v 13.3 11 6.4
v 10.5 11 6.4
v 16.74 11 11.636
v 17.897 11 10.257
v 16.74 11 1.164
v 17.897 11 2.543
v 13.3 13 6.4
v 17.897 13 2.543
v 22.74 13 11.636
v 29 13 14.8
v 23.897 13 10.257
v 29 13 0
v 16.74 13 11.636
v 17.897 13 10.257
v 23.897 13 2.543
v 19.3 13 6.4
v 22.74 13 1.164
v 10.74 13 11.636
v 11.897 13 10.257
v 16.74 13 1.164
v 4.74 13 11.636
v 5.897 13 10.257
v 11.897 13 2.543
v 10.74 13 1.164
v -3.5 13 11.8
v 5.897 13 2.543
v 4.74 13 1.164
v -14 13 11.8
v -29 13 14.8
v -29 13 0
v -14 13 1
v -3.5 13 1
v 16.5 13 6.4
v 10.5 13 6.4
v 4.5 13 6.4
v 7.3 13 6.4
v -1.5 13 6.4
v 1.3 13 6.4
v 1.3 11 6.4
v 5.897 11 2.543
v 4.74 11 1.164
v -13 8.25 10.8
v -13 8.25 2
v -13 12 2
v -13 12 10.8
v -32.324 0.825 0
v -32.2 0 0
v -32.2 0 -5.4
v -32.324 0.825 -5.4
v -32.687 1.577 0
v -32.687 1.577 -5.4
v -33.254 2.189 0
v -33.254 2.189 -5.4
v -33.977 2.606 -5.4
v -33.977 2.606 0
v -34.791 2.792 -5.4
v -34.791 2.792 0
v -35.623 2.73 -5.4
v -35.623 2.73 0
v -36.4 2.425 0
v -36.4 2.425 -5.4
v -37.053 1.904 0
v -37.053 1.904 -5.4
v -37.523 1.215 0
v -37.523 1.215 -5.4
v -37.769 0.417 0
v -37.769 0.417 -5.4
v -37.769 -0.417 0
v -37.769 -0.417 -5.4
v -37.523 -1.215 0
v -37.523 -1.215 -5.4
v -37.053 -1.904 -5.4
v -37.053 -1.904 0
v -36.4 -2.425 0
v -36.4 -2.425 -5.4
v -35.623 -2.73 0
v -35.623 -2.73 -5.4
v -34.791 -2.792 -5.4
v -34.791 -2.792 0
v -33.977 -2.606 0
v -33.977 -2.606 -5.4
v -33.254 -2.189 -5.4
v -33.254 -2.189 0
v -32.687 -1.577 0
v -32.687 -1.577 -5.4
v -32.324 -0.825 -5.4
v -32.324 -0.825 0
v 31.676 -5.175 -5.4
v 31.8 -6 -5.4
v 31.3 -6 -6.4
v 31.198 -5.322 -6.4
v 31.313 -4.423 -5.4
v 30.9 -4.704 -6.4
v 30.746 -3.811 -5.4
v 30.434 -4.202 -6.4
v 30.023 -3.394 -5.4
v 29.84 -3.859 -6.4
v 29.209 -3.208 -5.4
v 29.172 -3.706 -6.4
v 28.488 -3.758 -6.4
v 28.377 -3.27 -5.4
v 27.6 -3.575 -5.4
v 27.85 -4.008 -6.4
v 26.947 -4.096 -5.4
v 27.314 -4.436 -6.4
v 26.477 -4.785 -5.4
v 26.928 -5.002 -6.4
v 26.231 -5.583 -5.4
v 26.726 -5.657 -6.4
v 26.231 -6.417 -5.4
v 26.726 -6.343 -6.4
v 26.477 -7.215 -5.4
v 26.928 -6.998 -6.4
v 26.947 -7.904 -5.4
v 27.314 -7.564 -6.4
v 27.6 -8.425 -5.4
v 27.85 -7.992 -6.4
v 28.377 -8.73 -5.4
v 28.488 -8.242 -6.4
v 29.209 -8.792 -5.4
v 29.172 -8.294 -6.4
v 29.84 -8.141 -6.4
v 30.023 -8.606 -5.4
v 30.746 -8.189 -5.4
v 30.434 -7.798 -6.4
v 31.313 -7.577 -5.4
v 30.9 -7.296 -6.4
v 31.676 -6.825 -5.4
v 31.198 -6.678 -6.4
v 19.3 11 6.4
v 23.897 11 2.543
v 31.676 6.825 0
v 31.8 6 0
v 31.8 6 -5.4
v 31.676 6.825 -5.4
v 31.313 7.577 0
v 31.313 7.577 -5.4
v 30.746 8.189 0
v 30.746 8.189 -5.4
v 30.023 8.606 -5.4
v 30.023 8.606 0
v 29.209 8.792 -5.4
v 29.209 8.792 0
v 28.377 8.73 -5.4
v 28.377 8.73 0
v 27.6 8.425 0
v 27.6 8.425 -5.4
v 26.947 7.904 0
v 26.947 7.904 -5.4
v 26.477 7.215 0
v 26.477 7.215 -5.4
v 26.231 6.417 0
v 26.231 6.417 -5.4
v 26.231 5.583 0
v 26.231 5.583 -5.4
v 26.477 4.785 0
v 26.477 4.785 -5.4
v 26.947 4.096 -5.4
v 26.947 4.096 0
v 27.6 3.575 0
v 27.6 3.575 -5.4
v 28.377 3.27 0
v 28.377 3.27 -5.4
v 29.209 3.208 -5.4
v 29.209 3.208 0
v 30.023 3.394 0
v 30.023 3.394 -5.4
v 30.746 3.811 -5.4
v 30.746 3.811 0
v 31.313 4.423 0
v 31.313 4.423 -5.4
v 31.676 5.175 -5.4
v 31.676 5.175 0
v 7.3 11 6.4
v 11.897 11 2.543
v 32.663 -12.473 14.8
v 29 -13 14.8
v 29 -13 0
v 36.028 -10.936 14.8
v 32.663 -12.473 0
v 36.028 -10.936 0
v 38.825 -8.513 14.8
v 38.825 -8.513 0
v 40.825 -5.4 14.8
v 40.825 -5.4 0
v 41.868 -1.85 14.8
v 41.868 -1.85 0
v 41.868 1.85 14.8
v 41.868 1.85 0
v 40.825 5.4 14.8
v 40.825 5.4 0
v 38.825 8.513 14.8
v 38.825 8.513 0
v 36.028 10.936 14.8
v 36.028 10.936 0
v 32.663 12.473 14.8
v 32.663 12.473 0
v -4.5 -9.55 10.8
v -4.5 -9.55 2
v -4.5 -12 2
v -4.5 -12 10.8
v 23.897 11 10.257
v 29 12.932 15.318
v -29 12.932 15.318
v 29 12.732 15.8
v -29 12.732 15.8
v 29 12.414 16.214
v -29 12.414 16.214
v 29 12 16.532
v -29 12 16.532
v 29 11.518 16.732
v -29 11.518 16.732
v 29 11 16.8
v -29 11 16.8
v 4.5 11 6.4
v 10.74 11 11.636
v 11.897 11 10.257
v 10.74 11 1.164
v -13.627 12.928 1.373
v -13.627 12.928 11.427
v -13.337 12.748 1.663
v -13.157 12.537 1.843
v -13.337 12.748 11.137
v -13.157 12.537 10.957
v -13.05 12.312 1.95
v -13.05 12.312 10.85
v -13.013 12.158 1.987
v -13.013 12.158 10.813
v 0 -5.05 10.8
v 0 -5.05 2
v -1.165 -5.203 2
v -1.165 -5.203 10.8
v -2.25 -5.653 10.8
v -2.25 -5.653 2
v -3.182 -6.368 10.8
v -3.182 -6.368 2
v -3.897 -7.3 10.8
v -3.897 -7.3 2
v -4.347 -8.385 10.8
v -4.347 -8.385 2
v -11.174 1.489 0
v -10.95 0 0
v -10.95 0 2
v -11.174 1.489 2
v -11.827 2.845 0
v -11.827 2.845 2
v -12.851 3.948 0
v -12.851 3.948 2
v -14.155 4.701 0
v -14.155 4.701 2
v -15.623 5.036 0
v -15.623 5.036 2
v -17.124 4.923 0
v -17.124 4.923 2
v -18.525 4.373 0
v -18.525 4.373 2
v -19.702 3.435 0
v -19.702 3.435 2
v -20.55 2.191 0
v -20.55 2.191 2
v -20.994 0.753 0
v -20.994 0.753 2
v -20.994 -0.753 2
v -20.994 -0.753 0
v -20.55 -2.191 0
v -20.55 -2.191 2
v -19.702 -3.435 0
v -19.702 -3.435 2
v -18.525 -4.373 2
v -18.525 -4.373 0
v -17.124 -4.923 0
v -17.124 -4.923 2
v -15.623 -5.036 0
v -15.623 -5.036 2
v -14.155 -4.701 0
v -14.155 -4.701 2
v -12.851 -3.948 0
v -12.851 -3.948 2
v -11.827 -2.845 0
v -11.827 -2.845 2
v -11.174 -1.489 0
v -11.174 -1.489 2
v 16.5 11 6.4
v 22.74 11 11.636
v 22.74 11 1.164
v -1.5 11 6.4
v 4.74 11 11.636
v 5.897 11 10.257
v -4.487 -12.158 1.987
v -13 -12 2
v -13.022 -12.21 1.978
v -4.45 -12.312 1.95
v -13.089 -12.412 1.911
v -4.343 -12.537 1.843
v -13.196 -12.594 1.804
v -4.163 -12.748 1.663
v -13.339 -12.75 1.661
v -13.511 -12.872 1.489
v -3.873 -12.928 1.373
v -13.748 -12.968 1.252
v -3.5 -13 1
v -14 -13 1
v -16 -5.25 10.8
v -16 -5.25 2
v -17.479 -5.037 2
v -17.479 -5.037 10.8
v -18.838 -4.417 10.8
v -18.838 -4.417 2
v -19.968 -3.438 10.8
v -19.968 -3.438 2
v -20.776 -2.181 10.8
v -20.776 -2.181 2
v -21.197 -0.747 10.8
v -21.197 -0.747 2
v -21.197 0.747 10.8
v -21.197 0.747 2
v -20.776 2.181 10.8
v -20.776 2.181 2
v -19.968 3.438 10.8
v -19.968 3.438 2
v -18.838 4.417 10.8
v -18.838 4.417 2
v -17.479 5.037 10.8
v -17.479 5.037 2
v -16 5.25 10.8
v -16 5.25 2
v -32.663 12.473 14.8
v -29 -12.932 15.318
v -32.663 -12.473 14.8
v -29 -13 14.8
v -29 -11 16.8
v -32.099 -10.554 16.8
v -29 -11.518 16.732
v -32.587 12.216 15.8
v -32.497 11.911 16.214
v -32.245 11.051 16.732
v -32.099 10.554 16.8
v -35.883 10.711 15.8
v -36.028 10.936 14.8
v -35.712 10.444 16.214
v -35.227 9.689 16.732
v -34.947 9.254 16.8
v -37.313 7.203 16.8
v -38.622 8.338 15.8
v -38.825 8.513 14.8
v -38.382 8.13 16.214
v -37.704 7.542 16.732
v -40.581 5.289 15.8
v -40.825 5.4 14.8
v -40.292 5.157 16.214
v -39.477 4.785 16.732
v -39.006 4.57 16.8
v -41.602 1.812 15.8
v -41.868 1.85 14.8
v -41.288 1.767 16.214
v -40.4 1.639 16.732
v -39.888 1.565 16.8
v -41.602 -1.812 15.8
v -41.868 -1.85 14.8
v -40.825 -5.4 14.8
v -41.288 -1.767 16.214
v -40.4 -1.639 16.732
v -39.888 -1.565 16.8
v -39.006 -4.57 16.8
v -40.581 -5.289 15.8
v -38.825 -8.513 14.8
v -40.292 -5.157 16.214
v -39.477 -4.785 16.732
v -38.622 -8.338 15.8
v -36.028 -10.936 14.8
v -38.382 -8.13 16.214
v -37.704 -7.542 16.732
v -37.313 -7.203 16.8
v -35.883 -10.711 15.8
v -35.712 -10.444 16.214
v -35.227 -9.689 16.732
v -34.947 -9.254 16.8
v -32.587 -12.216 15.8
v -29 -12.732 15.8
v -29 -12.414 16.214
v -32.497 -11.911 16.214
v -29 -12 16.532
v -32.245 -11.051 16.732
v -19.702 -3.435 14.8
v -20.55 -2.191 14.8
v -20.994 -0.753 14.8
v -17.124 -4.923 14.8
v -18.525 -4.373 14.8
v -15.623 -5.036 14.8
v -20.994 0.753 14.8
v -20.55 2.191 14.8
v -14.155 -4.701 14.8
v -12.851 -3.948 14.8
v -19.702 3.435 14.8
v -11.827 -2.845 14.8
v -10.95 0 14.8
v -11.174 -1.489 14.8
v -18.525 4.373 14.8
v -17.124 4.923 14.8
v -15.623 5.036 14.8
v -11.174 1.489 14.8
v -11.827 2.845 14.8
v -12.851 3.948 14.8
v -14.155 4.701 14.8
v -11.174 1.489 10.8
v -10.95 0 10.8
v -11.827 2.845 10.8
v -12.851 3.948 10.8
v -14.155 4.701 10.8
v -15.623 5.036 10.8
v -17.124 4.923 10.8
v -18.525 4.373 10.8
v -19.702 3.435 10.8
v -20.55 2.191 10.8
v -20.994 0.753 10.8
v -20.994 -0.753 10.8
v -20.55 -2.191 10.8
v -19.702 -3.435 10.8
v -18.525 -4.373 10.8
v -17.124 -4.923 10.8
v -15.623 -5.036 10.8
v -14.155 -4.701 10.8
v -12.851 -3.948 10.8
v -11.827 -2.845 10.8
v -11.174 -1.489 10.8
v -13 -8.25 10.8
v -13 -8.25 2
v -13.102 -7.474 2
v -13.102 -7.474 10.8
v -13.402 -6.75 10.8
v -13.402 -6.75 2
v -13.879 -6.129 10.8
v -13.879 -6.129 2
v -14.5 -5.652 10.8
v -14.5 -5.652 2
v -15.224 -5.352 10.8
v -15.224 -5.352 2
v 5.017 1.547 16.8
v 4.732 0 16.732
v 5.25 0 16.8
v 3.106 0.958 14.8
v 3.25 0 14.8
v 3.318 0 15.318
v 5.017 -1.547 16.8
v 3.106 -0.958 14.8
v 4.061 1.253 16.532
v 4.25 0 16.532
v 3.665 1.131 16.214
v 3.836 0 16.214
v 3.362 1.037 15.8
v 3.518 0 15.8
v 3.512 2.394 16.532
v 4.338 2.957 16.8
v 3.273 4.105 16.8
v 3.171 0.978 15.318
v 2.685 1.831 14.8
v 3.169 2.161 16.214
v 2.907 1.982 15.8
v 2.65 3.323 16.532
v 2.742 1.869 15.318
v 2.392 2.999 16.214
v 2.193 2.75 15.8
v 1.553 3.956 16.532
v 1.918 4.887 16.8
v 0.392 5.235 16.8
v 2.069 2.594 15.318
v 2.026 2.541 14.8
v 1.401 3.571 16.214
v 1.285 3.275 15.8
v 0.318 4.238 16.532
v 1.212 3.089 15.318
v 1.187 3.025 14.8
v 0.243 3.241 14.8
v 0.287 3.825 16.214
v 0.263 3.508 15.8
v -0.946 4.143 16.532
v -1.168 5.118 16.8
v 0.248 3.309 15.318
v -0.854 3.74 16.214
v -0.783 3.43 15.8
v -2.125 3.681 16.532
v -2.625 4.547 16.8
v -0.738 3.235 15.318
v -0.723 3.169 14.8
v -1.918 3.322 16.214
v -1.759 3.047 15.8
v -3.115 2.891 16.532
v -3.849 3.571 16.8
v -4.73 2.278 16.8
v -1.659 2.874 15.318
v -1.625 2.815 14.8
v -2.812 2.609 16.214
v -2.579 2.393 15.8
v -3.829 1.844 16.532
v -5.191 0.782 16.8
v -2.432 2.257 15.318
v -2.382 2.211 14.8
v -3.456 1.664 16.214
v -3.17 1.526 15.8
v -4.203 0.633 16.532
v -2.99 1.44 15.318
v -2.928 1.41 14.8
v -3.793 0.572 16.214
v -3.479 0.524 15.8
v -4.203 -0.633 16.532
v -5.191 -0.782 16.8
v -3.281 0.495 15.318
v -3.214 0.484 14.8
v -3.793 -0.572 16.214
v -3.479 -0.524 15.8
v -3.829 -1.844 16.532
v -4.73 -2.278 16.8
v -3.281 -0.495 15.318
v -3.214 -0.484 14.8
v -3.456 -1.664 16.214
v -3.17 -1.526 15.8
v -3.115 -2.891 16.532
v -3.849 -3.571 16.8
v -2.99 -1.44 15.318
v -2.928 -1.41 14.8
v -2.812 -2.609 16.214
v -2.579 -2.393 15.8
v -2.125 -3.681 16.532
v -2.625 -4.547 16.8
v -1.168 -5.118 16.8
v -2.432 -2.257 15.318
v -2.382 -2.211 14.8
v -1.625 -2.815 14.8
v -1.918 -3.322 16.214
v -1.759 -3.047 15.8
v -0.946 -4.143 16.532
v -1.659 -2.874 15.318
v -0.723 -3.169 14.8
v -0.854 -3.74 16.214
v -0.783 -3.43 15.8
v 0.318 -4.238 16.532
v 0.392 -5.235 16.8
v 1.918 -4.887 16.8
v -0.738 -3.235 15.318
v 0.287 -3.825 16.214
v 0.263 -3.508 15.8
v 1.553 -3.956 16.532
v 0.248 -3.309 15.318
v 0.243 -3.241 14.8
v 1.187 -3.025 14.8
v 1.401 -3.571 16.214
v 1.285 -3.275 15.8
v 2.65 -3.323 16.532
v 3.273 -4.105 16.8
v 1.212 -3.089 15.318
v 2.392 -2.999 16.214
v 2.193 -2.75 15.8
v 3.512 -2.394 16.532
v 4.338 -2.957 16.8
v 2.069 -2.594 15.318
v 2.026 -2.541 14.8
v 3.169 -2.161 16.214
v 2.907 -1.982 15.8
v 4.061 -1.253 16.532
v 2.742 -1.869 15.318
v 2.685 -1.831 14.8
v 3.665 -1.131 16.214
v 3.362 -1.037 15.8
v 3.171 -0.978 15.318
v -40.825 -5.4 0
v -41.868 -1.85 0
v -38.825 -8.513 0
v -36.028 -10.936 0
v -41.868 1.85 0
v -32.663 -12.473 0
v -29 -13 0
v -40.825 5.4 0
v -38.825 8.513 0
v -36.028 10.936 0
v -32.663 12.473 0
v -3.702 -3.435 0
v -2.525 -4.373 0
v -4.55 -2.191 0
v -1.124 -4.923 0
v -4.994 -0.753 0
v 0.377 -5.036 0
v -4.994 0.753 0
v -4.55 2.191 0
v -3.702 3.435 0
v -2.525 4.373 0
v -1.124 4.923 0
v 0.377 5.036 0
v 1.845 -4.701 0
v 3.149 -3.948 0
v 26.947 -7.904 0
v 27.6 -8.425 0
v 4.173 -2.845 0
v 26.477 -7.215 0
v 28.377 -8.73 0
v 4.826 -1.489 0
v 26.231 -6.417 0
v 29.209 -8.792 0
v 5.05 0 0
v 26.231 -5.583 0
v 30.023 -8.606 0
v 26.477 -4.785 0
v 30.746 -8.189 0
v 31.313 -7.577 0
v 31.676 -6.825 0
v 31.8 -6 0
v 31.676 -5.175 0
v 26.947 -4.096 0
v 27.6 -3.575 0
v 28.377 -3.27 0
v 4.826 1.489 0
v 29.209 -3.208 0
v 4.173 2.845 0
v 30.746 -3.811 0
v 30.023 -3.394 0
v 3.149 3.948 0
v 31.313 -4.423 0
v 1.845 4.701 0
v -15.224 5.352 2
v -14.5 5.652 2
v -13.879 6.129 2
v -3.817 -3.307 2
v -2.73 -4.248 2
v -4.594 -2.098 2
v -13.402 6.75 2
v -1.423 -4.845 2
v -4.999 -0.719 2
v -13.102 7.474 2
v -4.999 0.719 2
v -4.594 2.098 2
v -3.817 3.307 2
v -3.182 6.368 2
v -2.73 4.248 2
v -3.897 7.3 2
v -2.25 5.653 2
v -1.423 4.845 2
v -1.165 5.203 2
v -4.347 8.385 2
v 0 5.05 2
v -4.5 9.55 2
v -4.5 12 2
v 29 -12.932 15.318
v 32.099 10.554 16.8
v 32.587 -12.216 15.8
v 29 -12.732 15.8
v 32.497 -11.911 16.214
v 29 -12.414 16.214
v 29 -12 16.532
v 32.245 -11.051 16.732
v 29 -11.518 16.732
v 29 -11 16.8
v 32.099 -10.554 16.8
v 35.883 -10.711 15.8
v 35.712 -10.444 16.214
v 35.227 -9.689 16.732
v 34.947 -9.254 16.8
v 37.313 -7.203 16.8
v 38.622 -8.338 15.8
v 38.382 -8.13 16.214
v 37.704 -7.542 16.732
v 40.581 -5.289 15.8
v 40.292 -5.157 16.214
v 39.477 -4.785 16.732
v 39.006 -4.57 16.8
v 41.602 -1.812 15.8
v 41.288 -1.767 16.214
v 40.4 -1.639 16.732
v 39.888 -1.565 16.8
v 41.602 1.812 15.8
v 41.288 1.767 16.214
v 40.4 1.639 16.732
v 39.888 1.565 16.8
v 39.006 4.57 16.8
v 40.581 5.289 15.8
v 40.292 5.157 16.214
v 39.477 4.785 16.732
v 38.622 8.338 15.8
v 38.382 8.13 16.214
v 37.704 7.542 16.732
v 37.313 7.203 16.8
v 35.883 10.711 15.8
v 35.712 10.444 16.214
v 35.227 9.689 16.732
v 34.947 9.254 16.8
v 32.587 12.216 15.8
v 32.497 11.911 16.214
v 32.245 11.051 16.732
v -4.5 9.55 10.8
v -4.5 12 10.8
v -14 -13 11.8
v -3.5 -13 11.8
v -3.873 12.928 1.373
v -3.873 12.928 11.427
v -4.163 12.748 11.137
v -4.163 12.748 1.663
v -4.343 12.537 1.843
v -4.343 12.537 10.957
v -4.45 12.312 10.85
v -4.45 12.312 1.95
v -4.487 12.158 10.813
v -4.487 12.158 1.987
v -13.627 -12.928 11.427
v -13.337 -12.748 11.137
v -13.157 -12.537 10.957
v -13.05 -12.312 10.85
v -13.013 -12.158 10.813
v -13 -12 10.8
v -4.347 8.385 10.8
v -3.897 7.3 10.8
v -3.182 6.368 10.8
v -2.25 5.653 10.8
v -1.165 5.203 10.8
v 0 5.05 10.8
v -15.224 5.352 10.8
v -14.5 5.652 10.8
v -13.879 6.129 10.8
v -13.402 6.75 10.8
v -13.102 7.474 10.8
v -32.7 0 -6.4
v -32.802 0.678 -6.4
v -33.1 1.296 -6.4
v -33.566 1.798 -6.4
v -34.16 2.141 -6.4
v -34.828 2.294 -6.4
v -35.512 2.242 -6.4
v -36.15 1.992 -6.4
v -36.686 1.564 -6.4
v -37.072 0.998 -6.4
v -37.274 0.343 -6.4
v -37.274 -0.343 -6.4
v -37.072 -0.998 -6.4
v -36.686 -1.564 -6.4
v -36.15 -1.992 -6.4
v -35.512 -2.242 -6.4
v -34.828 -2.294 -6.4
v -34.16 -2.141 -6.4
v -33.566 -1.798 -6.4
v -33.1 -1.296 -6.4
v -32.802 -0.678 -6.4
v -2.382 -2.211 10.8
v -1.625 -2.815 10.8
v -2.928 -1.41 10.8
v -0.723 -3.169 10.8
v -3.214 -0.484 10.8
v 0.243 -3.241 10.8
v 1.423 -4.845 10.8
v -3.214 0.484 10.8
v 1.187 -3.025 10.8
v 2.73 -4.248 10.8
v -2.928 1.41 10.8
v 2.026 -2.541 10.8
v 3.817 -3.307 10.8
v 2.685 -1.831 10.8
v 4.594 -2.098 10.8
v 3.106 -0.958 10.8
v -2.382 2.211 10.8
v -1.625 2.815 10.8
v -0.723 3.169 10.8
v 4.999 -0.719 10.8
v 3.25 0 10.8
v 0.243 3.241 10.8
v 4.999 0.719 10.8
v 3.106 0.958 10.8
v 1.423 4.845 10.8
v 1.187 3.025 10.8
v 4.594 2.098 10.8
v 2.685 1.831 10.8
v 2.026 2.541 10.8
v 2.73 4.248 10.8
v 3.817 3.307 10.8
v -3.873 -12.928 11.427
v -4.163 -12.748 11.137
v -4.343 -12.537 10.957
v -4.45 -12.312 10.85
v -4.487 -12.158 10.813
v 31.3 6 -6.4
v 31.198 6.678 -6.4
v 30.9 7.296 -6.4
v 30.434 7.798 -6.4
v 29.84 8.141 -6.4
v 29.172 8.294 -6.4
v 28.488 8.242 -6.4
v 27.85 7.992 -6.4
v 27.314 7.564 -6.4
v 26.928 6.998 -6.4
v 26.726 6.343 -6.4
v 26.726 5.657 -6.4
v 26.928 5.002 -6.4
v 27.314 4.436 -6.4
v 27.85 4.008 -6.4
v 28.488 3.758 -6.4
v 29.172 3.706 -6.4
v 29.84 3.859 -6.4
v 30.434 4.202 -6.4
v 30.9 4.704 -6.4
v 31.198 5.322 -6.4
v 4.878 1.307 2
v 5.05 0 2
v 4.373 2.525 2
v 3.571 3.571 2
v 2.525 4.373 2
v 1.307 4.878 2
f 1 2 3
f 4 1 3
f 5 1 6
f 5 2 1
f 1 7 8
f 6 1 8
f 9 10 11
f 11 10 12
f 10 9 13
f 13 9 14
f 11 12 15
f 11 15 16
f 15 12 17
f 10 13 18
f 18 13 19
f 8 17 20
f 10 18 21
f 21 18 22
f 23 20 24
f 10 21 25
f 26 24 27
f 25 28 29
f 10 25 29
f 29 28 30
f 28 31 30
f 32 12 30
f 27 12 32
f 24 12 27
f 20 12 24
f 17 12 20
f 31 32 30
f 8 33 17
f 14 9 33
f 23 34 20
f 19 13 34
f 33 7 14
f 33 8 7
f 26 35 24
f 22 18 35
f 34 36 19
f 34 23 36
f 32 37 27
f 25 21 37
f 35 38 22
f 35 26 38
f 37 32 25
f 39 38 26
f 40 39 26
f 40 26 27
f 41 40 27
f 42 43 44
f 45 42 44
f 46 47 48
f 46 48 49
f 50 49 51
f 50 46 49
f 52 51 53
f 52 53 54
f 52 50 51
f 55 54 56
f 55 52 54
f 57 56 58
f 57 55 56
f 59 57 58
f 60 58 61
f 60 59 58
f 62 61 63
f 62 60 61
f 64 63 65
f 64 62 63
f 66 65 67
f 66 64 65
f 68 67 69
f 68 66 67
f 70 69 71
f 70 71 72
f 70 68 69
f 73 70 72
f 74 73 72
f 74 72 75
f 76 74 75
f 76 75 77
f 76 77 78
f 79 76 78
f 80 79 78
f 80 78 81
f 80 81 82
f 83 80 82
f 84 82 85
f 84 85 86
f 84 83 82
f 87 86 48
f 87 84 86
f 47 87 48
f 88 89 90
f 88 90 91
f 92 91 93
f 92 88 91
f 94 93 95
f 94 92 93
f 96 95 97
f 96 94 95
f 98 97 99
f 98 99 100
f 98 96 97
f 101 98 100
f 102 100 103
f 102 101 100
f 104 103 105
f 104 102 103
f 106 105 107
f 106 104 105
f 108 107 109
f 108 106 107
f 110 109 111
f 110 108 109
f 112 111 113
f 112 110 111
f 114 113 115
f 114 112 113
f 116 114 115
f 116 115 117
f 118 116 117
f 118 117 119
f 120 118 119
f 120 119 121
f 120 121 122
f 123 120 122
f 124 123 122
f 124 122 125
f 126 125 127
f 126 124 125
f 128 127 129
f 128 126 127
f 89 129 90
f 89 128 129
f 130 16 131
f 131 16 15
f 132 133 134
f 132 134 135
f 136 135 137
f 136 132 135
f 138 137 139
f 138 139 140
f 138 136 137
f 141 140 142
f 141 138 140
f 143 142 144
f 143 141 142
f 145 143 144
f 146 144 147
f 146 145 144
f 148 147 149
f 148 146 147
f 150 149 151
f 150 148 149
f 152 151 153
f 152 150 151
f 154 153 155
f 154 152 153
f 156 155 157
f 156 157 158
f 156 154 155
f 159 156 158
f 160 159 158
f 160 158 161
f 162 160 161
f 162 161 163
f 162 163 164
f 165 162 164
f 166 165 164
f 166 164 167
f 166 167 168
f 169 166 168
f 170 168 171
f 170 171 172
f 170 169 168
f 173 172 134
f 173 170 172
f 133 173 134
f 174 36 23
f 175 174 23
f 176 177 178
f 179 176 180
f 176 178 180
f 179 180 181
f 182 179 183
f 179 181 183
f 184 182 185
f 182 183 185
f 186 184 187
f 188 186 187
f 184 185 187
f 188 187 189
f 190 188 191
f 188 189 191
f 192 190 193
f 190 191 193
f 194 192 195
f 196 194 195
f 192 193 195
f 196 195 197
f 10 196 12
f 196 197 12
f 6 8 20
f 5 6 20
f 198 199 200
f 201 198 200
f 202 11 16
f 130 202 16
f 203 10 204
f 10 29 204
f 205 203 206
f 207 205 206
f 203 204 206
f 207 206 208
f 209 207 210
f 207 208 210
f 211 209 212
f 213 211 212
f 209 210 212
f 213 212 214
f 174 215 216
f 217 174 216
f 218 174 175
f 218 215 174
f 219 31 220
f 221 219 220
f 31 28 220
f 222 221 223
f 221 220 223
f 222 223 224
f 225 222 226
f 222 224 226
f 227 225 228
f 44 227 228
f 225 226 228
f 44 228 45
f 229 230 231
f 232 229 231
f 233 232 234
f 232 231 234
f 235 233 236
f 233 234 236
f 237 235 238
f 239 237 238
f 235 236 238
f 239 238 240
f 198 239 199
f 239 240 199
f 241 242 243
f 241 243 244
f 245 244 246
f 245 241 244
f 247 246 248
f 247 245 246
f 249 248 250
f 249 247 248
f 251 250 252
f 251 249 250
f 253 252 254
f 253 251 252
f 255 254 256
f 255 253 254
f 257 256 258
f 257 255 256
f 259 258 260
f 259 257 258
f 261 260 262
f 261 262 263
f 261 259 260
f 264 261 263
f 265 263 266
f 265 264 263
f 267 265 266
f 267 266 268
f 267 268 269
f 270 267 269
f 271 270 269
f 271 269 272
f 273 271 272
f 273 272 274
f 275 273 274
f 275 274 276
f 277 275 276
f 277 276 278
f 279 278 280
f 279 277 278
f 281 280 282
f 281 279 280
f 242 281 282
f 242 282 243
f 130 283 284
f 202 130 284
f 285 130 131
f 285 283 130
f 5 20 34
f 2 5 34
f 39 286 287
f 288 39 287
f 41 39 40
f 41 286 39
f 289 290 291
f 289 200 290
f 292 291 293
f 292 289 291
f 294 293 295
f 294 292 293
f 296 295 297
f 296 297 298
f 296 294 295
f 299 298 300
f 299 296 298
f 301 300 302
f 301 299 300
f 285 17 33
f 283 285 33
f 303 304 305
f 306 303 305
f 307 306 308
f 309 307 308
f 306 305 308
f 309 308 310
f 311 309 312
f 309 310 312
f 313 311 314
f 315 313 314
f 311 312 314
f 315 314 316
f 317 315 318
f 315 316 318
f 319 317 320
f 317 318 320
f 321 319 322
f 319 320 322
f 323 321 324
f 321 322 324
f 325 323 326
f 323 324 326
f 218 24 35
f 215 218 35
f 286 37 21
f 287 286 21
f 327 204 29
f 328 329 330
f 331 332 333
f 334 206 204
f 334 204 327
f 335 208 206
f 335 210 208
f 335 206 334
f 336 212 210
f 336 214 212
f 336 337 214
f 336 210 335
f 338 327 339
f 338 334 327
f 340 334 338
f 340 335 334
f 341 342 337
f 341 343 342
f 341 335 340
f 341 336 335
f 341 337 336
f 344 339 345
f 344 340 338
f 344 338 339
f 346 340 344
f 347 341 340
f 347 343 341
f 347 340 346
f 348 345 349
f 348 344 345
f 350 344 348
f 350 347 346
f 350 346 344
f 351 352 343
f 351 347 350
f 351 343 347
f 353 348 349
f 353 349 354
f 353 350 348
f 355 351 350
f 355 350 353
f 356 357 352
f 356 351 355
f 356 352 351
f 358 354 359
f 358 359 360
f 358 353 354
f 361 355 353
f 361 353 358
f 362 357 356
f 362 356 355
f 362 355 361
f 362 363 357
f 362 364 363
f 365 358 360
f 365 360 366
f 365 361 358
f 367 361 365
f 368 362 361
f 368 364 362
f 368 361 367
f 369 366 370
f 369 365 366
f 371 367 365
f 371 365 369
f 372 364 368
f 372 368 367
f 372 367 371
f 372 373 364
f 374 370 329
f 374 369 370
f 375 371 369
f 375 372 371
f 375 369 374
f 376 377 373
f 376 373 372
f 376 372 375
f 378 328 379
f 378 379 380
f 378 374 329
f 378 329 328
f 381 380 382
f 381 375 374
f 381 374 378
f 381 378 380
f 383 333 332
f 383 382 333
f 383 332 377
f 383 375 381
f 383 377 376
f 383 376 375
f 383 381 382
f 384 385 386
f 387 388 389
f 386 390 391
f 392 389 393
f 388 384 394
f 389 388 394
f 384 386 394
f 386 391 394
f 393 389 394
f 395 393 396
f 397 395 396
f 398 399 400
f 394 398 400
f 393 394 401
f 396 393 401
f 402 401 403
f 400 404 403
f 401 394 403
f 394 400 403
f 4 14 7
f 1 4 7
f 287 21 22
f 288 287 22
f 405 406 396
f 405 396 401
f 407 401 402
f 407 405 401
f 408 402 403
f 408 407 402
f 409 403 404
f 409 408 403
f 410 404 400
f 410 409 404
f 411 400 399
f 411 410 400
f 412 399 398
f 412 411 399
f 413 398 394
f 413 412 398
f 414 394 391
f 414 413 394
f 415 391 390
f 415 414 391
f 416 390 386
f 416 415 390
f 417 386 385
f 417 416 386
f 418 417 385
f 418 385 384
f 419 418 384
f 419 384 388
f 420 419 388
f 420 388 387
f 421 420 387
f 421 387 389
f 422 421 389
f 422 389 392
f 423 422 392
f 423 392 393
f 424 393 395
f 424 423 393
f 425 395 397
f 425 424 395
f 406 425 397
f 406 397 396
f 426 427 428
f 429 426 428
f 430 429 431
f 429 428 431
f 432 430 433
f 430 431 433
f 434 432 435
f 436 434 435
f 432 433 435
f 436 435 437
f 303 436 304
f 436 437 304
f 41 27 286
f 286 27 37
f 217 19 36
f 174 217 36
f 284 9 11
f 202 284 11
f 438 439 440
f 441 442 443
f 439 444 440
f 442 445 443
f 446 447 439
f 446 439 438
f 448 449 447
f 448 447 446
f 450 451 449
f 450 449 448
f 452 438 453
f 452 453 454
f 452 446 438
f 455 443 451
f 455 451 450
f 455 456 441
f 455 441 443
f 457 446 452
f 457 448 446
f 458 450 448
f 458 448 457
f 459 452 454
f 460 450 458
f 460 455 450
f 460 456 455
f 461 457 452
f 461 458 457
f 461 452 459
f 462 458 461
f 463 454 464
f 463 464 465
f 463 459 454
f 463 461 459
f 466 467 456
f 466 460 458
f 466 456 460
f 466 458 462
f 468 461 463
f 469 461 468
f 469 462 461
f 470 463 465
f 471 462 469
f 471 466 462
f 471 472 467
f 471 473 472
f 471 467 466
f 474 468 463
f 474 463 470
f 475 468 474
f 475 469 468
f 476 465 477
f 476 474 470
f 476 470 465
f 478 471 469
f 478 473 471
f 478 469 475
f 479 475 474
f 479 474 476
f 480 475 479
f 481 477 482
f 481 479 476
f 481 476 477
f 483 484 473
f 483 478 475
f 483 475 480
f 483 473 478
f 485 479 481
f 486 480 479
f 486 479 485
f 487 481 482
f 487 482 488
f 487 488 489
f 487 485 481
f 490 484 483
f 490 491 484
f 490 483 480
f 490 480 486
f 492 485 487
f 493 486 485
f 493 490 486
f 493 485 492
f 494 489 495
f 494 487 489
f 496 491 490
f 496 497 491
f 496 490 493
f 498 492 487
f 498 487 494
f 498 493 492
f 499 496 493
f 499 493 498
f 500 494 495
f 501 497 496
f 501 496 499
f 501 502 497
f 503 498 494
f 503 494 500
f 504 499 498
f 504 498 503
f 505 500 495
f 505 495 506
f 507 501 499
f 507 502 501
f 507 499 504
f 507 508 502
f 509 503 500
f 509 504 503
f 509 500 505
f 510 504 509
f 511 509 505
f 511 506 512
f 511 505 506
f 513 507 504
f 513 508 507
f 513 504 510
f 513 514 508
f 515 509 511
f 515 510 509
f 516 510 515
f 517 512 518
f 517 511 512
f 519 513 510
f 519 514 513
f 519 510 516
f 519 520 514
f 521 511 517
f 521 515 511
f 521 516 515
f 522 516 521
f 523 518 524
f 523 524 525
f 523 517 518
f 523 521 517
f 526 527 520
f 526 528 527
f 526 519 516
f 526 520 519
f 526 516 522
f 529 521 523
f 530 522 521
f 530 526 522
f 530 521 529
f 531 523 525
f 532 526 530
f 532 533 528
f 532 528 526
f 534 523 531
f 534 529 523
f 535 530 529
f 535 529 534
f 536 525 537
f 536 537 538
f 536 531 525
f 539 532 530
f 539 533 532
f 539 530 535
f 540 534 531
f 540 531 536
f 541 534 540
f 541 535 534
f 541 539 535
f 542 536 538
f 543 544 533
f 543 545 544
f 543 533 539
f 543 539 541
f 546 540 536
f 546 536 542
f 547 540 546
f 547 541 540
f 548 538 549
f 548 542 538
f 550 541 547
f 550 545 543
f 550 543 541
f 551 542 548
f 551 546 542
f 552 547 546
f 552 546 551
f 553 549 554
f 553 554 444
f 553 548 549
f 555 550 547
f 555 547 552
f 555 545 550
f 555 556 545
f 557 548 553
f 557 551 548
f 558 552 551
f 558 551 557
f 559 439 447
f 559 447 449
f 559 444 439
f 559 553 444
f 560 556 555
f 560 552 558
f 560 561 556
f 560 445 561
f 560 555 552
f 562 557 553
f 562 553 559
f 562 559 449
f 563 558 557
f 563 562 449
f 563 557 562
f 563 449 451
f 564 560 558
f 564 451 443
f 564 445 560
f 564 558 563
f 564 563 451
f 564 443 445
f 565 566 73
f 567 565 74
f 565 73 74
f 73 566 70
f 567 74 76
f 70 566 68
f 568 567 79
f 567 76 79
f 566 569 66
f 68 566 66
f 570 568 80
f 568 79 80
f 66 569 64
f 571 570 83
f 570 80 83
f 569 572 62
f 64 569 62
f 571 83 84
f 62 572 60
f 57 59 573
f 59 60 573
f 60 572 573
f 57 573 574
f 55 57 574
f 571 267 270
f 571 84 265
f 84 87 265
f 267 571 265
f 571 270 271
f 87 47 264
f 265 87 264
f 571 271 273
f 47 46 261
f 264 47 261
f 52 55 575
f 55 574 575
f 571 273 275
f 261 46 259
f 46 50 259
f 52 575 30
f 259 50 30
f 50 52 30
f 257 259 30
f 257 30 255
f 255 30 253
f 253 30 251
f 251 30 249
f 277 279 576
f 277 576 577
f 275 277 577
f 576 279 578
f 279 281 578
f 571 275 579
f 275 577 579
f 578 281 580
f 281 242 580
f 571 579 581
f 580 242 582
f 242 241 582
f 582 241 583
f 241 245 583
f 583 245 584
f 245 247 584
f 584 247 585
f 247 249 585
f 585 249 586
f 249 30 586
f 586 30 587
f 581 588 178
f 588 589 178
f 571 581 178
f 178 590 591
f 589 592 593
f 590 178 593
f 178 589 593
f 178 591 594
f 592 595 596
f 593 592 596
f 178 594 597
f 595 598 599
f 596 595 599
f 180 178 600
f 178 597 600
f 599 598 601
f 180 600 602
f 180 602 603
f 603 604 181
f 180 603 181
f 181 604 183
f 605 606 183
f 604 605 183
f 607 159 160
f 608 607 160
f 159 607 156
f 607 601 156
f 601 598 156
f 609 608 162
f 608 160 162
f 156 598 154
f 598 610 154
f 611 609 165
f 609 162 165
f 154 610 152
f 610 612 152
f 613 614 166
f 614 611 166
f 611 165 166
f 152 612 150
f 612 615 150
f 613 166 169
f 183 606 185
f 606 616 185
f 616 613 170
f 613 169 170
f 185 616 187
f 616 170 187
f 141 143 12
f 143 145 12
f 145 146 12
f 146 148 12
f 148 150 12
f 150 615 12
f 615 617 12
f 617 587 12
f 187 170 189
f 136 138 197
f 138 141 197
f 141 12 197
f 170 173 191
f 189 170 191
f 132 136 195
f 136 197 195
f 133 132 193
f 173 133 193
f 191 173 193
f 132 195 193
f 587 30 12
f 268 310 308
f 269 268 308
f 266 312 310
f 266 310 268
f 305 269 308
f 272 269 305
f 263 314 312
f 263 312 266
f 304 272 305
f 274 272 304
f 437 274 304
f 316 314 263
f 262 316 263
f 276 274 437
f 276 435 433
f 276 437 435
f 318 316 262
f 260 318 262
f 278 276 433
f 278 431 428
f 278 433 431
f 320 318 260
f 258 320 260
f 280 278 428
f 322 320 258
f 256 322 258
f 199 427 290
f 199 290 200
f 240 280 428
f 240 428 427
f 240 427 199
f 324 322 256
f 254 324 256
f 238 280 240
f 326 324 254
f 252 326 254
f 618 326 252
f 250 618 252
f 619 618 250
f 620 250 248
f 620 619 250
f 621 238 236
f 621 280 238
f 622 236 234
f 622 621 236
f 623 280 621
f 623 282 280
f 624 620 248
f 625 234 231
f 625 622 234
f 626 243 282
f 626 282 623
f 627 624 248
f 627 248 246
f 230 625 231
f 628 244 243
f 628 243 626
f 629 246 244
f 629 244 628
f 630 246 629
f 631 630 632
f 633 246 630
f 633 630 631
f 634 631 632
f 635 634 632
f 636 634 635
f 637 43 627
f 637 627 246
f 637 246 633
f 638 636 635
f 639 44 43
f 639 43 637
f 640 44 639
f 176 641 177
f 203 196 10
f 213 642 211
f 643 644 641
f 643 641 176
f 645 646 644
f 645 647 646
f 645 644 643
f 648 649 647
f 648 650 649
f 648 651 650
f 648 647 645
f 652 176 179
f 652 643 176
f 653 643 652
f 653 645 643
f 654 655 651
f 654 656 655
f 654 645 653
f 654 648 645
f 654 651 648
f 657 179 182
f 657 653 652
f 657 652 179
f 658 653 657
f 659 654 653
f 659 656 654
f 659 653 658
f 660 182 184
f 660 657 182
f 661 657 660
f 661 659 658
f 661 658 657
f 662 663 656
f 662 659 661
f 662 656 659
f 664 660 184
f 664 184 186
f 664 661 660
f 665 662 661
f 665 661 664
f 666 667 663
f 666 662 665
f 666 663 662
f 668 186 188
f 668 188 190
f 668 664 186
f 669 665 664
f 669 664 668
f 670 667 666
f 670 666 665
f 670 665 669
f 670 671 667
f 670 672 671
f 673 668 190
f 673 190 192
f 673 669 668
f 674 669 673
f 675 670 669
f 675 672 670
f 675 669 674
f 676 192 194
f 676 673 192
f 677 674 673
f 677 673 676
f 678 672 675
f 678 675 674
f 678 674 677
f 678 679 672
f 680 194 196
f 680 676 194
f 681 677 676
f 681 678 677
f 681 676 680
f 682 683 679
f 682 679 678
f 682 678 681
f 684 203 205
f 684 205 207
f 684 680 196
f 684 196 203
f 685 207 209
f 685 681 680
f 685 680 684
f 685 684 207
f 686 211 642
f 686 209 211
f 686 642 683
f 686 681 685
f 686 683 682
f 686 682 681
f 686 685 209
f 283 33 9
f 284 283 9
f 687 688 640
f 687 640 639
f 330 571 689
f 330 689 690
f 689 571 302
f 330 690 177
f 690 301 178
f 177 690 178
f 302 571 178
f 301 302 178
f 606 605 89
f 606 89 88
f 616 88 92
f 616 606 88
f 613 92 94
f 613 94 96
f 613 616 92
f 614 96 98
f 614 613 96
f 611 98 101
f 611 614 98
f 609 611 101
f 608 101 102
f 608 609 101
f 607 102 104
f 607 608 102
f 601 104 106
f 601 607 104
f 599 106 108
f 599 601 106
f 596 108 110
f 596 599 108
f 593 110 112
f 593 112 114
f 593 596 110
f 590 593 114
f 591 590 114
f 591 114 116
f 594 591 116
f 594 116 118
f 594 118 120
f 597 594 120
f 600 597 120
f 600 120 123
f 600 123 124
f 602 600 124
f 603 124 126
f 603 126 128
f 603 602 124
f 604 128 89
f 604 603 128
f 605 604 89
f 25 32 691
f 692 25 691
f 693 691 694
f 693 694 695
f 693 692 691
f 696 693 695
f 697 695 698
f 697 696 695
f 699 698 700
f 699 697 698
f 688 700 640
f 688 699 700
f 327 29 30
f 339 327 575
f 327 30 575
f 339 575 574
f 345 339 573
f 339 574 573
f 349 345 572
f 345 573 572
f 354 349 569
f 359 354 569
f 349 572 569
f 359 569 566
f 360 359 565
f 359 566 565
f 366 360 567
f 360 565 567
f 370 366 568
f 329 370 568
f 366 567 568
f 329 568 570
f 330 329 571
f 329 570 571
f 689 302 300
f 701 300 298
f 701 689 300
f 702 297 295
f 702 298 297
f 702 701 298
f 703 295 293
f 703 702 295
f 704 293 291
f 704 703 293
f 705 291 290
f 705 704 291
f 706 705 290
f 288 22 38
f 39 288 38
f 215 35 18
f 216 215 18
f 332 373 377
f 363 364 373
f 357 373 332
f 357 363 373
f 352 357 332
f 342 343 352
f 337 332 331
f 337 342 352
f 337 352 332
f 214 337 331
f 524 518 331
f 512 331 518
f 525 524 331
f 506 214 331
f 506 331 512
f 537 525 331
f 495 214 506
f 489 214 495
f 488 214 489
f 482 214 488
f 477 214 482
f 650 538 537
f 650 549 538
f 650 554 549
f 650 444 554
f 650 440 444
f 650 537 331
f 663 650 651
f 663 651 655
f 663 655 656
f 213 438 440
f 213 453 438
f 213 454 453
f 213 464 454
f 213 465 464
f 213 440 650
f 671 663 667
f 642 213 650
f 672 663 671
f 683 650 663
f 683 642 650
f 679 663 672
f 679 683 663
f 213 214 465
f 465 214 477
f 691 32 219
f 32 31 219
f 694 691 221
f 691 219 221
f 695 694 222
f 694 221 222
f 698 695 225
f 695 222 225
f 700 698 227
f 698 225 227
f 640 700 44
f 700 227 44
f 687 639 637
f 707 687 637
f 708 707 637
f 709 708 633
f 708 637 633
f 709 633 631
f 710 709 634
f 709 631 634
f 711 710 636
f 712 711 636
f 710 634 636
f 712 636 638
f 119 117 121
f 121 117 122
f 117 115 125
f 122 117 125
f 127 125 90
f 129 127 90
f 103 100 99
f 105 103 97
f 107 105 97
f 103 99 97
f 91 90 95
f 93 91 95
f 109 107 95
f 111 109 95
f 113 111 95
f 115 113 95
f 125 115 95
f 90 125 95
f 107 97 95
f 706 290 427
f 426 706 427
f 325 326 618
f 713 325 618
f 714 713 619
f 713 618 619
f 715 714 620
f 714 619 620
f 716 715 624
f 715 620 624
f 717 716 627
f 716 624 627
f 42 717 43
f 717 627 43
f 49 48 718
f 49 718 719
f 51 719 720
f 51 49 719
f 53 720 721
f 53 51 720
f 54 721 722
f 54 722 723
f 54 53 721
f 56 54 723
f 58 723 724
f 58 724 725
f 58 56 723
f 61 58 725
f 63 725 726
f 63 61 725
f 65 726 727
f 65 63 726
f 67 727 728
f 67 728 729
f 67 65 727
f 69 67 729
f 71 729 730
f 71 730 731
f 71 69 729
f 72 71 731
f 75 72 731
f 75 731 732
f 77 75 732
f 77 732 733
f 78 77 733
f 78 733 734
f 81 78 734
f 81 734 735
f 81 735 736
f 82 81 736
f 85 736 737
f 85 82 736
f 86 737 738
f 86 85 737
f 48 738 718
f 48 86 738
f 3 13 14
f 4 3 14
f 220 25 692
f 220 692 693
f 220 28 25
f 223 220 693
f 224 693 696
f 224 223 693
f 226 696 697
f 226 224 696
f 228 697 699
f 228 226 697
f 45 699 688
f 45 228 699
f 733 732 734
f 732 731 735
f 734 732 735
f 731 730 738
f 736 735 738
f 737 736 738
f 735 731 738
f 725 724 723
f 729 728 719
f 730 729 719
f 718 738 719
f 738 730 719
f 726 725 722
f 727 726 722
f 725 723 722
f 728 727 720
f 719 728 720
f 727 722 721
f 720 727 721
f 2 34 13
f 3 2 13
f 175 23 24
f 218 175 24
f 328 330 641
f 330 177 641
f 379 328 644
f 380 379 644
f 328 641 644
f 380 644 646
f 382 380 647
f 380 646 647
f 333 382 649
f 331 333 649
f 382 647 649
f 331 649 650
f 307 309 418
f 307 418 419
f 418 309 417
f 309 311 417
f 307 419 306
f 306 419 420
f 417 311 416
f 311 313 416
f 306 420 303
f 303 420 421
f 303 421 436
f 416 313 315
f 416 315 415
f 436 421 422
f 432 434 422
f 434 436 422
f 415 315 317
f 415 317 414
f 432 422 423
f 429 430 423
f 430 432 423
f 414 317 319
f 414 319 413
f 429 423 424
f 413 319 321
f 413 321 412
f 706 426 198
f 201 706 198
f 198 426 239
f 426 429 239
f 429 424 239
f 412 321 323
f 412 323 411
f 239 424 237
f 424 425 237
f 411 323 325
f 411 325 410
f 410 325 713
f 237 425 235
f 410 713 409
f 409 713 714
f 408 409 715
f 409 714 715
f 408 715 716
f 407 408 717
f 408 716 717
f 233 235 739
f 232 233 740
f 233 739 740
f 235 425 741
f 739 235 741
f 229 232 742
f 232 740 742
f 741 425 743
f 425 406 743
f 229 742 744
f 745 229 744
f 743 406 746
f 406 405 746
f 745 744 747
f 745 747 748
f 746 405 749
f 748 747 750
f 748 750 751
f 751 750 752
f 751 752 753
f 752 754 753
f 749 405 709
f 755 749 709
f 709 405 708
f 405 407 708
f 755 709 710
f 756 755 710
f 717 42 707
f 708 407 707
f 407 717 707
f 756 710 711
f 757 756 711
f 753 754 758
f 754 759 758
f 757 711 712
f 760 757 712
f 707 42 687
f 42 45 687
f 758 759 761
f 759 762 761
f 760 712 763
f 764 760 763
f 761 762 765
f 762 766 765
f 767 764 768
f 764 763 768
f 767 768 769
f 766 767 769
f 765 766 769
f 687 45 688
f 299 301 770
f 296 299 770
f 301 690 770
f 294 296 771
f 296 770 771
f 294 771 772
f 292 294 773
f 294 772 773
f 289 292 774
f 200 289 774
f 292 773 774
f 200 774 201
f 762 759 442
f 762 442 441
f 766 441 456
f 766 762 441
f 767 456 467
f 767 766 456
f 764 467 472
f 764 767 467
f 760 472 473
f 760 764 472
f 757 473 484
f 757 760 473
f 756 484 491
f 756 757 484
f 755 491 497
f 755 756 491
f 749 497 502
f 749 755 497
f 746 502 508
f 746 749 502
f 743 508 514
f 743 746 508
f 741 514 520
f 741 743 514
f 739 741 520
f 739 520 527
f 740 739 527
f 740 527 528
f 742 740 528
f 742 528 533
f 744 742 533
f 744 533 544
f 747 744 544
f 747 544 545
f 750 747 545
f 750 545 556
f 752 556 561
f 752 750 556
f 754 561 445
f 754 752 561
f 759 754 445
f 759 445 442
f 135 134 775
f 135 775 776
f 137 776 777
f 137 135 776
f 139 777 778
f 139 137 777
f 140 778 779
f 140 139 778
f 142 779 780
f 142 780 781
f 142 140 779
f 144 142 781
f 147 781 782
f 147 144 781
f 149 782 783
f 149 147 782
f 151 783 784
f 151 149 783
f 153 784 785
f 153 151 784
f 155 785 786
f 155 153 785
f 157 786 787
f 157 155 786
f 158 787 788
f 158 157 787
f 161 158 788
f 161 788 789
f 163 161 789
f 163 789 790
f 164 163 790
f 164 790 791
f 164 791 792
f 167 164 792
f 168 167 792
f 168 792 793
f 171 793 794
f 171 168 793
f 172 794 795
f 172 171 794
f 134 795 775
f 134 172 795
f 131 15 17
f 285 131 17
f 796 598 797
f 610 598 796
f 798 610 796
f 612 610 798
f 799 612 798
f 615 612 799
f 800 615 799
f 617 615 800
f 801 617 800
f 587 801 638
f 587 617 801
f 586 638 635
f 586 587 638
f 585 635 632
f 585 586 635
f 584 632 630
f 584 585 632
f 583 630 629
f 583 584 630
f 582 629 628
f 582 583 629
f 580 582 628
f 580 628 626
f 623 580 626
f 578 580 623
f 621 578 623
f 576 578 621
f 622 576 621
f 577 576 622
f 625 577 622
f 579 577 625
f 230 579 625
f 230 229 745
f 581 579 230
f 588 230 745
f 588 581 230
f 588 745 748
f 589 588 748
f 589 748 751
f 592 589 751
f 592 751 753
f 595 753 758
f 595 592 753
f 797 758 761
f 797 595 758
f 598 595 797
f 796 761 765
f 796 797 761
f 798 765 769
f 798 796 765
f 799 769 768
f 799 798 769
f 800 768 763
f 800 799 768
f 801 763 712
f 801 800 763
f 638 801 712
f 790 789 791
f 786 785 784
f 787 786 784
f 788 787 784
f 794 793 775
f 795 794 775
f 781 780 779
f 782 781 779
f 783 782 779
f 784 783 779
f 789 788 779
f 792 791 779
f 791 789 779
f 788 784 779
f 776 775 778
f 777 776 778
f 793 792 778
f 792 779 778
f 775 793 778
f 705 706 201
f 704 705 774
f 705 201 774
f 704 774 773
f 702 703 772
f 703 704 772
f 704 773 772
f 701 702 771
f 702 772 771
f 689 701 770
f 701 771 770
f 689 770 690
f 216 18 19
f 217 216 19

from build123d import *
from OCP.BRepFilletAPI import BRepFilletAPI_MakeChamfer

# Parameters (mm, degrees)
SKETCH1_R             = 2.8
BOSS_EXTRUDE1_DEPTH   = 6.4
BOSS_EXTRUDE1_2_DEPTH = 6.4
BOSS_EXTRUDE1_3_DEPTH = 6.4
SKETCH1_3_R           = 5.05
BOSS_EXTRUDE2_DEPTH   = 2
BOSS_EXTRUDE3_DEPTH   = 8.8
SKETCH6_R             = 5.05
SKETCH6_R_2           = 3.25
BOSS_EXTRUDE4_DEPTH   = 6
SKETCH6_4_R           = 5.05
CUT_EXTRUDE1_DEPTH    = 4
FILLET1_R             = 2
FILLET2_R             = 1
CHAMFER1_SIZE         = 0.5
CHAMFER1_SIZE2        = 1
CUT_EXTRUDE2_DEPTH    = 2


with BuildPart() as part:
    # Sketch1 → Boss-Extrude1 (new body)
    with BuildSketch(Plane.XY):
        with Locations((29, 6)):
            Circle(SKETCH1_R)
    extrude(amount=-BOSS_EXTRUDE1_DEPTH)



with BuildPart() as body_2:
    # Sketch1 → Boss-Extrude1 2 (new body)
    with BuildSketch(Plane.XY):
        with Locations((29, -6)):
            Circle(SKETCH1_R)
    extrude(amount=-BOSS_EXTRUDE1_2_DEPTH)


with BuildPart() as body_3:
    # Sketch1 → Boss-Extrude1 3 (new body)
    with BuildSketch(Plane.XY):
        with Locations((-35, 0)):
            Circle(SKETCH1_R)
    extrude(amount=-BOSS_EXTRUDE1_3_DEPTH)


with BuildPart() as part_1:
    add(part.part)

    add(body_2.part)  # Boss-Extrude2 merges body 2

    add(body_3.part)  # Boss-Extrude2 merges body 3
    # Sketch1<3> → Boss-Extrude2 (add)
    with BuildSketch(Plane.XY):
        with BuildLine():
            Line((29, 13), (-29, 13))
            ThreePointArc((-29, 13), (-42, 0), (-29, -13))
            Line((-29, -13), (29, -13))
            ThreePointArc((29, -13), (42, 0), (29, 13))
        make_face()
        with Locations((-16, 0)):
            Circle(SKETCH1_3_R, mode=Mode.SUBTRACT)
        Circle(SKETCH1_3_R, mode=Mode.SUBTRACT)
    extrude(amount=BOSS_EXTRUDE2_DEPTH)

    # Sketch5 → Boss-Extrude3 (add)
    with BuildSketch(Plane.XY.offset(2)):
        with BuildLine():
            Line((-4.5, -9.55), (-4.5, -13))
            Line((-4.5, -13), (29, -13))
            ThreePointArc((29, -13), (42, 0), (29, 13))
            Line((29, 13), (-4.5, 13))
            Line((-4.5, 13), (-4.5, 9.55))
            ThreePointArc((-4.5, 9.55), (-3.181980515, 6.368019485), (0, 5.05))
            ThreePointArc((0, 5.05), (5.05, 0), (0, -5.05))
            ThreePointArc((0, -5.05), (-3.181980515, -6.368019485), (-4.5, -9.55))
        make_face()
        with BuildLine():
            Line((-13, 8.25), (-13, 13))
            Line((-13, 13), (-29, 13))
            ThreePointArc((-29, 13), (-42, 0), (-29, -13))
            Line((-29, -13), (-13, -13))
            Line((-13, -13), (-13, -8.25))
            ThreePointArc((-13, -8.25), (-13.878679656, -6.128679656), (-16, -5.25))
            ThreePointArc((-16, -5.25), (-21.25, 0), (-16, 5.25))
            ThreePointArc((-16, 5.25), (-13.878679656, 6.128679656), (-13, 8.25))
        make_face()
    extrude(amount=BOSS_EXTRUDE3_DEPTH)

    # Sketch6 → Boss-Extrude4 (add)
    # profile 1 of 3: a face of its own
    with BuildSketch(Plane.XY.offset(10.8)):
        with BuildLine():
            ThreePointArc((-16, -5.25), (-21.25, 0), (-16, 5.25))
            ThreePointArc((-16, 5.25), (-13.878679656, 6.128679656), (-13, 8.25))
            Line((-13, 8.25), (-13, 13))
            Line((-13, 13), (-29, 13))
            ThreePointArc((-29, 13), (-42, 0), (-29, -13))
            Line((-29, -13), (-13, -13))
            Line((-13, -13), (-13, -8.25))
            ThreePointArc((-13, -8.25), (-13.878679656, -6.128679656), (-16, -5.25))
        make_face()
    # profile 2 of 3: a face of its own
    with BuildSketch(Plane.XY.offset(10.8)):
        with BuildLine():
            ThreePointArc((29, -13), (42, 0), (29, 13))
            Line((29, 13), (-13, 13))
            Line((-13, 13), (-13, 8.25))
            ThreePointArc((-13, 8.25), (-13.878679656, 6.128679656), (-16, 5.25))
            ThreePointArc((-16, 5.25), (-21.25, 0), (-16, -5.25))
            ThreePointArc((-16, -5.25), (-13.878679656, -6.128679656), (-13, -8.25))
            Line((-13, -8.25), (-13, -13))
            Line((-13, -13), (29, -13))
        make_face()
        with Locations((-16, 0)):
            Circle(SKETCH6_R, mode=Mode.SUBTRACT)
        Circle(SKETCH6_R_2, mode=Mode.SUBTRACT)
    # profile 3 of 3: a face of its own
    with BuildSketch(Plane.XY.offset(10.8)):
        with Locations((-16, 0)):
            Circle(SKETCH6_R)
    extrude(amount=BOSS_EXTRUDE4_DEPTH)

    # Sketch6<4> → Cut-Extrude1 (cut)
    with BuildSketch(Plane.XY.offset(10.8)):
        with Locations((-16, 0)):
            Circle(SKETCH6_4_R)
    extrude(amount=CUT_EXTRUDE1_DEPTH, mode=Mode.SUBTRACT)

    # Fillet1
    fillet1_edges = [part_1.edges().sort_by_distance(p)[0] for p in [
        (-3.25, 0, 16.8),
        (42, 0, 16.8),
        (0, 13, 16.8),
        (-42, 0, 16.8),
        (0, -13, 16.8),
    ]]
    fillet(fillet1_edges, radius=FILLET1_R)

    # Fillet2
    fillet2_edges = [part_1.edges().sort_by_distance(p)[0] for p in [
        (-8.75, 13, 2),
        (-4.5, 13, 6.4),
        (-4.5, -13, 6.4),
        (-8.75, -13, 2),
        (-13, -13, 6.4),
        (-13, 13, 6.4),
        (-8.75, 13, 10.8),
        (-8.75, -13, 10.8),
    ]]
    fillet(fillet2_edges, radius=FILLET2_R)

    # Chamfer1: one chamfer whose edges measure the first distance from different faces: ONE call of the kernel's chamfer builder (chamfer() names one face for all edges)
    chamfer1_edges_1 = [part_1.edges().sort_by_distance(p)[0] for p in [
        (26.2, 6, -6.4),
    ]]
    chamfer1_side_1 = [part_1.faces().sort_by_distance(p)[0] for p in [
        (29, 6, -6.4),
    ]]
    chamfer1_edges_2 = [part_1.edges().sort_by_distance(p)[0] for p in [
        (26.2, -6, -6.4),
    ]]
    chamfer1_side_2 = [part_1.faces().sort_by_distance(p)[0] for p in [
        (29, -6, -6.4),
    ]]
    chamfer1_edges_3 = [part_1.edges().sort_by_distance(p)[0] for p in [
        (-37.8, 0, -6.4),
    ]]
    chamfer1_side_3 = [part_1.faces().sort_by_distance(p)[0] for p in [
        (-35, 0, -6.4),
    ]]
    chamfer1 = BRepFilletAPI_MakeChamfer(part_1.part.solid().wrapped)
    for e in chamfer1_edges_1:
        chamfer1.Add(CHAMFER1_SIZE, CHAMFER1_SIZE2, e.wrapped, chamfer1_side_1[0].wrapped)  # the first distance lies on this face
    for e in chamfer1_edges_2:
        chamfer1.Add(CHAMFER1_SIZE, CHAMFER1_SIZE2, e.wrapped, chamfer1_side_2[0].wrapped)  # the first distance lies on this face
    for e in chamfer1_edges_3:
        chamfer1.Add(CHAMFER1_SIZE, CHAMFER1_SIZE2, e.wrapped, chamfer1_side_3[0].wrapped)  # the first distance lies on this face
    add(Compound.cast(chamfer1.Shape()), mode=Mode.REPLACE)

    # Sketch7 → Cut-Extrude2 (cut)
    with BuildSketch(Plane(origin=(0, 13, 0), x_dir=(1, 0, 0), z_dir=(0, 1, 0))):
        Polygon((-1.5, -6.4), (4.73955185, -11.635605656), (5.896569547, -10.256725658), (1.300302888, -6.4), (5.896569547, -2.543274342), (4.73955185, -1.164394344), align=None)
        Polygon((10.73955185, -1.164394344), (4.5, -6.4), (10.73955185, -11.635605656), (11.896569547, -10.256725658), (7.300302888, -6.4), (11.896569547, -2.543274342), align=None)
        Polygon((16.73955185, -1.164394344), (10.5, -6.4), (16.73955185, -11.635605656), (17.896569547, -10.256725658), (13.300302888, -6.4), (17.896569547, -2.543274342), align=None)
        Polygon((22.73955185, -1.164394344), (16.5, -6.4), (22.73955185, -11.635605656), (23.896569547, -10.256725658), (19.300302888, -6.4), (23.896569547, -2.543274342), align=None)
    extrude(amount=-CUT_EXTRUDE2_DEPTH, mode=Mode.SUBTRACT)


solid = part_1.part
